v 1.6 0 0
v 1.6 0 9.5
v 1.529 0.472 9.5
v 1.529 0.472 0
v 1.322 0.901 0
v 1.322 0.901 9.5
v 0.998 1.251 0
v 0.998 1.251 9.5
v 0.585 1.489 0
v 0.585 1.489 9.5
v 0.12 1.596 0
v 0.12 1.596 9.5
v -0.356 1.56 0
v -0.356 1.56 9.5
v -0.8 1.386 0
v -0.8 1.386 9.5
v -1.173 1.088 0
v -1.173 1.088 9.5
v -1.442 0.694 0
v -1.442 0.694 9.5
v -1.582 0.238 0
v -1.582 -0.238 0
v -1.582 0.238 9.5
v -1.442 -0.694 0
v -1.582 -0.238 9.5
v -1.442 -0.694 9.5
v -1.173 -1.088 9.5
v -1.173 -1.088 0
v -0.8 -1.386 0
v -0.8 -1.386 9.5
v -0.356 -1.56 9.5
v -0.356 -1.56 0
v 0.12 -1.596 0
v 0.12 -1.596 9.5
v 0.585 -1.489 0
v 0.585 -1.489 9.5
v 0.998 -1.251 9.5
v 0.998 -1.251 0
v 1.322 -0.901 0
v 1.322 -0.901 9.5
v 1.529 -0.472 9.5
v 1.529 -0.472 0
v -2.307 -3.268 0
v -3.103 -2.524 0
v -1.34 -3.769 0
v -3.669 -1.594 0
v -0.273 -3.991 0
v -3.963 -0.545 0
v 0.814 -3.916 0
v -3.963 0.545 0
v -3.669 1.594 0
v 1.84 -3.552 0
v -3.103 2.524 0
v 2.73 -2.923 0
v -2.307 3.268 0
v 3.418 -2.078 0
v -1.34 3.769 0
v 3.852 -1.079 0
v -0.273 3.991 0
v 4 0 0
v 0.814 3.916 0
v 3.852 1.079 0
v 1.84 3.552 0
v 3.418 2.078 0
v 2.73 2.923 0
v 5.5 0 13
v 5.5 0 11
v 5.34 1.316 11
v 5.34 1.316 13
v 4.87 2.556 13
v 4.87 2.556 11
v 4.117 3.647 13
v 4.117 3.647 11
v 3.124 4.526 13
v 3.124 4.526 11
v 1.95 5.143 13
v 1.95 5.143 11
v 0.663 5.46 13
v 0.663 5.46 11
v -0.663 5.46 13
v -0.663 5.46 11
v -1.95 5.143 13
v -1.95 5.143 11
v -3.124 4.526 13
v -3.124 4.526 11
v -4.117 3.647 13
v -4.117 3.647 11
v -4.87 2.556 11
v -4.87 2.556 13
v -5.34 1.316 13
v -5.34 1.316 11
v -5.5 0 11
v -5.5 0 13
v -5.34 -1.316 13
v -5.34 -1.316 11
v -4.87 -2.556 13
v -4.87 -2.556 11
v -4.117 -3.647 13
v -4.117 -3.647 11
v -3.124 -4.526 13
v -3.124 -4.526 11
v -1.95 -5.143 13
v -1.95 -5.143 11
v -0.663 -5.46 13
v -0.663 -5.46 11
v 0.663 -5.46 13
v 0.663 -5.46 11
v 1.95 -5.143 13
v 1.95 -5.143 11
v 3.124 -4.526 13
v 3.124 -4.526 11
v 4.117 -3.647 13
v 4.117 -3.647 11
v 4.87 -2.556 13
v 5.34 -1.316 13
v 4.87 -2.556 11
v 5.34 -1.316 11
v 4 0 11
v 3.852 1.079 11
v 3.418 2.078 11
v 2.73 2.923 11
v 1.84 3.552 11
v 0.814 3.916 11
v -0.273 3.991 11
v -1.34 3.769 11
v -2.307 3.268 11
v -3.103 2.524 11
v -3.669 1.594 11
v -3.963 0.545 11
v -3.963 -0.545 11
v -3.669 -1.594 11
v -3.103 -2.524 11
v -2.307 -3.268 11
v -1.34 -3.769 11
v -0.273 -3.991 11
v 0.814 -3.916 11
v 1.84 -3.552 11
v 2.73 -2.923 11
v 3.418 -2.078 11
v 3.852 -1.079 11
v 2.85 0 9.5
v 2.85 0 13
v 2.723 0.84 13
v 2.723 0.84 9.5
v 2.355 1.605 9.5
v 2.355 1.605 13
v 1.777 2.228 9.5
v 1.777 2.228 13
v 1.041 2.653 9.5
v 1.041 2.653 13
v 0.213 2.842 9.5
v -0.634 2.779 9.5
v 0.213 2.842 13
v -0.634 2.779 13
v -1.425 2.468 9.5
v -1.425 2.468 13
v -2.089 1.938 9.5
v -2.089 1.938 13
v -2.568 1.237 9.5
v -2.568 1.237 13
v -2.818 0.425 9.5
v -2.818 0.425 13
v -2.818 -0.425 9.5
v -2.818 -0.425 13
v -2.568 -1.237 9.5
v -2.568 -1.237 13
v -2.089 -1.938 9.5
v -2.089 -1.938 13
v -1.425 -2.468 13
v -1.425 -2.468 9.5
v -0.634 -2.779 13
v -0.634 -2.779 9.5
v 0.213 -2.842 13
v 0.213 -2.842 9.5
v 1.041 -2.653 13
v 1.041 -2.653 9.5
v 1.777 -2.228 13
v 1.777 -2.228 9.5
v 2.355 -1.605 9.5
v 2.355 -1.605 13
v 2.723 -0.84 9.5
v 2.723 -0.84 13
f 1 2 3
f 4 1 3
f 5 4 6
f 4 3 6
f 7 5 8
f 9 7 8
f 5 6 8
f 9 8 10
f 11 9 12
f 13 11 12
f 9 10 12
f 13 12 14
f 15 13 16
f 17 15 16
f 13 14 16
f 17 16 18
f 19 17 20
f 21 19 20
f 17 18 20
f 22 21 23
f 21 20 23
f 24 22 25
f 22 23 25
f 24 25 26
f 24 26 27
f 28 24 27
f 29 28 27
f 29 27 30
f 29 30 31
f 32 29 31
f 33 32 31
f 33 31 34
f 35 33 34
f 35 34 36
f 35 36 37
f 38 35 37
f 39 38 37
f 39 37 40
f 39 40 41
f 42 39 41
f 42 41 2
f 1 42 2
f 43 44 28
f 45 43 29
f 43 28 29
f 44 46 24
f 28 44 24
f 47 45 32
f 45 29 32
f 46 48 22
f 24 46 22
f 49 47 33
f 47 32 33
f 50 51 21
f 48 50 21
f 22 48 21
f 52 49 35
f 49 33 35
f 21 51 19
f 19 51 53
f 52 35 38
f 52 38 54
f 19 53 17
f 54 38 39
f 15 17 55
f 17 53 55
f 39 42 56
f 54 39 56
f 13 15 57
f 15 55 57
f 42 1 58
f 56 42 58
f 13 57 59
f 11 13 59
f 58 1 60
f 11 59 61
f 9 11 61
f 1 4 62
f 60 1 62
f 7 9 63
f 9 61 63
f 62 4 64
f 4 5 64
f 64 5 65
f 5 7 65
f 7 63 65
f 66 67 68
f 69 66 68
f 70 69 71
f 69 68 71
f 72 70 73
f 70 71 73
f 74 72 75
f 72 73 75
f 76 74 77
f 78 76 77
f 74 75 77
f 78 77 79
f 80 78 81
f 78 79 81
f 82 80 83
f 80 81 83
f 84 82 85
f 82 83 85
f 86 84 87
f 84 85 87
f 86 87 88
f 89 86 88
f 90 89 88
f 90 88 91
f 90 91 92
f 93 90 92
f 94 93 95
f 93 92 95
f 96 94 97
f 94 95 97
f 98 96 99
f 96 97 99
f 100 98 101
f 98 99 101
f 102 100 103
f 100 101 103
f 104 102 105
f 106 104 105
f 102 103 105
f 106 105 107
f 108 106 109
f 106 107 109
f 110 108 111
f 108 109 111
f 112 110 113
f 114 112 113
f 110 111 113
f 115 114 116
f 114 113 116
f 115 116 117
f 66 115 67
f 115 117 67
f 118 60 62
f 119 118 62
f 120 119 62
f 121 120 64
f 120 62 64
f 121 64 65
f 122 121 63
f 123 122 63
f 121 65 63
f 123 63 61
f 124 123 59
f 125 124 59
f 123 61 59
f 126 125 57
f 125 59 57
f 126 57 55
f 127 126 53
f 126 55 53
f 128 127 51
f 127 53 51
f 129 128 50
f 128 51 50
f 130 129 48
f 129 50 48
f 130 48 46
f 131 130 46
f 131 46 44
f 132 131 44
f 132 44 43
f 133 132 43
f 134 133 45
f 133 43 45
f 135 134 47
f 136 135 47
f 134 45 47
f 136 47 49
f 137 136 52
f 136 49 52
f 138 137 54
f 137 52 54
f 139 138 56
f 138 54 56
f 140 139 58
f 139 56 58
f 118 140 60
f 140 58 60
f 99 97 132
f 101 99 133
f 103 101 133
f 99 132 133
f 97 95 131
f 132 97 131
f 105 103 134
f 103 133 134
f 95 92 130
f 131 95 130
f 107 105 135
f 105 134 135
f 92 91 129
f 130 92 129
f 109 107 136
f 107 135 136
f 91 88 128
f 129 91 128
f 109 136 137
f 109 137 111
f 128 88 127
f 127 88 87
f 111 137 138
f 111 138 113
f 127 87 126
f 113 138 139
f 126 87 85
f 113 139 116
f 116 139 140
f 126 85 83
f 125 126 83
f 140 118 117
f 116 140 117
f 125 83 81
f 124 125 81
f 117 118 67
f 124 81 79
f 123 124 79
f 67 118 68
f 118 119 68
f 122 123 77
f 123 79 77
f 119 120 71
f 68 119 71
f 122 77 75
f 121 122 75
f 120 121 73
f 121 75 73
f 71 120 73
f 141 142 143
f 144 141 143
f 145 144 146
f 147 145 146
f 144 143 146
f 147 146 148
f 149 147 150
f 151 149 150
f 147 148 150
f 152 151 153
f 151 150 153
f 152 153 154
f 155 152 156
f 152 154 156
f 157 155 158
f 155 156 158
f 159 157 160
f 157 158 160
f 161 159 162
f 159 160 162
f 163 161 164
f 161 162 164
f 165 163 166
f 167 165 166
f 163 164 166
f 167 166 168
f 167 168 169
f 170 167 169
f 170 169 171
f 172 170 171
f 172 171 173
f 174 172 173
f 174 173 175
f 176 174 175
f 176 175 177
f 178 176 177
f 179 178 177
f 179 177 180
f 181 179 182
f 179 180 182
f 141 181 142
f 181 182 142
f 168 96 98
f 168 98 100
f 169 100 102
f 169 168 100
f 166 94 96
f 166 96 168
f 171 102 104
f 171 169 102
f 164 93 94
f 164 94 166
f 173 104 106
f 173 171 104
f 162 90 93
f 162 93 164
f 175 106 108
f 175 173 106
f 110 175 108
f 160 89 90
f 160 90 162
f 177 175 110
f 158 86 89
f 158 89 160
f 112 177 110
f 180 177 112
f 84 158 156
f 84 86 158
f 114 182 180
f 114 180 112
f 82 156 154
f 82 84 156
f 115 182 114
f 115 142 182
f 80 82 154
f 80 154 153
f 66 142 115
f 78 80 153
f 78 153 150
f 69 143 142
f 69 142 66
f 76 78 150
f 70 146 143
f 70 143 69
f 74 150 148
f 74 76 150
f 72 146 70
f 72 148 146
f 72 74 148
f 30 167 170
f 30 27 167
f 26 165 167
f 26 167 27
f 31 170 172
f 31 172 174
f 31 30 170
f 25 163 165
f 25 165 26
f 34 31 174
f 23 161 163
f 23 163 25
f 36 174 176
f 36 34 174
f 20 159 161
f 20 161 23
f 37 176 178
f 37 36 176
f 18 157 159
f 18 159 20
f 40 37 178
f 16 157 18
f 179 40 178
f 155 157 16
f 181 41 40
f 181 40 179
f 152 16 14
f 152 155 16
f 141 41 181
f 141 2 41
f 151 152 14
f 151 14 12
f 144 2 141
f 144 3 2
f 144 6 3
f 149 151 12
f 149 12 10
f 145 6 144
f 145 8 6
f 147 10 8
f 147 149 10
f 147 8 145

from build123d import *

# Parameters (mm, degrees)
F0_R     = 4
F1_DEPTH = 11
F2_R     = 5.5
F2_R_2   = 4
F3_DEPTH = 2
F4_R     = 2.85
F5_DEPTH = 3.5
F6_R     = 1.6
F7_DEPTH = 25


with BuildPart() as f1:
    # F0 (on Top) → F1 (new body)
    with BuildSketch(Plane.XY):
        Circle(F0_R)
    extrude(amount=F1_DEPTH)

    # F2 (on face) → F3 (join)
    with BuildSketch(Plane.XY.offset(11)):
        Circle(F2_R)
        Circle(F2_R_2, mode=Mode.SUBTRACT)
        Circle(F2_R_2)
    extrude(amount=F3_DEPTH)

    # F4 (on face) → F5 (cut)
    with BuildSketch(Plane.XY.offset(13)):
        Circle(F4_R)
    extrude(amount=-F5_DEPTH, mode=Mode.SUBTRACT)

    # F6 (on face) → F7 (cut)
    with BuildSketch(Plane.XY.offset(9.5)):
        Circle(F6_R)
    extrude(amount=-F7_DEPTH, mode=Mode.SUBTRACT)


solid = f1.part
